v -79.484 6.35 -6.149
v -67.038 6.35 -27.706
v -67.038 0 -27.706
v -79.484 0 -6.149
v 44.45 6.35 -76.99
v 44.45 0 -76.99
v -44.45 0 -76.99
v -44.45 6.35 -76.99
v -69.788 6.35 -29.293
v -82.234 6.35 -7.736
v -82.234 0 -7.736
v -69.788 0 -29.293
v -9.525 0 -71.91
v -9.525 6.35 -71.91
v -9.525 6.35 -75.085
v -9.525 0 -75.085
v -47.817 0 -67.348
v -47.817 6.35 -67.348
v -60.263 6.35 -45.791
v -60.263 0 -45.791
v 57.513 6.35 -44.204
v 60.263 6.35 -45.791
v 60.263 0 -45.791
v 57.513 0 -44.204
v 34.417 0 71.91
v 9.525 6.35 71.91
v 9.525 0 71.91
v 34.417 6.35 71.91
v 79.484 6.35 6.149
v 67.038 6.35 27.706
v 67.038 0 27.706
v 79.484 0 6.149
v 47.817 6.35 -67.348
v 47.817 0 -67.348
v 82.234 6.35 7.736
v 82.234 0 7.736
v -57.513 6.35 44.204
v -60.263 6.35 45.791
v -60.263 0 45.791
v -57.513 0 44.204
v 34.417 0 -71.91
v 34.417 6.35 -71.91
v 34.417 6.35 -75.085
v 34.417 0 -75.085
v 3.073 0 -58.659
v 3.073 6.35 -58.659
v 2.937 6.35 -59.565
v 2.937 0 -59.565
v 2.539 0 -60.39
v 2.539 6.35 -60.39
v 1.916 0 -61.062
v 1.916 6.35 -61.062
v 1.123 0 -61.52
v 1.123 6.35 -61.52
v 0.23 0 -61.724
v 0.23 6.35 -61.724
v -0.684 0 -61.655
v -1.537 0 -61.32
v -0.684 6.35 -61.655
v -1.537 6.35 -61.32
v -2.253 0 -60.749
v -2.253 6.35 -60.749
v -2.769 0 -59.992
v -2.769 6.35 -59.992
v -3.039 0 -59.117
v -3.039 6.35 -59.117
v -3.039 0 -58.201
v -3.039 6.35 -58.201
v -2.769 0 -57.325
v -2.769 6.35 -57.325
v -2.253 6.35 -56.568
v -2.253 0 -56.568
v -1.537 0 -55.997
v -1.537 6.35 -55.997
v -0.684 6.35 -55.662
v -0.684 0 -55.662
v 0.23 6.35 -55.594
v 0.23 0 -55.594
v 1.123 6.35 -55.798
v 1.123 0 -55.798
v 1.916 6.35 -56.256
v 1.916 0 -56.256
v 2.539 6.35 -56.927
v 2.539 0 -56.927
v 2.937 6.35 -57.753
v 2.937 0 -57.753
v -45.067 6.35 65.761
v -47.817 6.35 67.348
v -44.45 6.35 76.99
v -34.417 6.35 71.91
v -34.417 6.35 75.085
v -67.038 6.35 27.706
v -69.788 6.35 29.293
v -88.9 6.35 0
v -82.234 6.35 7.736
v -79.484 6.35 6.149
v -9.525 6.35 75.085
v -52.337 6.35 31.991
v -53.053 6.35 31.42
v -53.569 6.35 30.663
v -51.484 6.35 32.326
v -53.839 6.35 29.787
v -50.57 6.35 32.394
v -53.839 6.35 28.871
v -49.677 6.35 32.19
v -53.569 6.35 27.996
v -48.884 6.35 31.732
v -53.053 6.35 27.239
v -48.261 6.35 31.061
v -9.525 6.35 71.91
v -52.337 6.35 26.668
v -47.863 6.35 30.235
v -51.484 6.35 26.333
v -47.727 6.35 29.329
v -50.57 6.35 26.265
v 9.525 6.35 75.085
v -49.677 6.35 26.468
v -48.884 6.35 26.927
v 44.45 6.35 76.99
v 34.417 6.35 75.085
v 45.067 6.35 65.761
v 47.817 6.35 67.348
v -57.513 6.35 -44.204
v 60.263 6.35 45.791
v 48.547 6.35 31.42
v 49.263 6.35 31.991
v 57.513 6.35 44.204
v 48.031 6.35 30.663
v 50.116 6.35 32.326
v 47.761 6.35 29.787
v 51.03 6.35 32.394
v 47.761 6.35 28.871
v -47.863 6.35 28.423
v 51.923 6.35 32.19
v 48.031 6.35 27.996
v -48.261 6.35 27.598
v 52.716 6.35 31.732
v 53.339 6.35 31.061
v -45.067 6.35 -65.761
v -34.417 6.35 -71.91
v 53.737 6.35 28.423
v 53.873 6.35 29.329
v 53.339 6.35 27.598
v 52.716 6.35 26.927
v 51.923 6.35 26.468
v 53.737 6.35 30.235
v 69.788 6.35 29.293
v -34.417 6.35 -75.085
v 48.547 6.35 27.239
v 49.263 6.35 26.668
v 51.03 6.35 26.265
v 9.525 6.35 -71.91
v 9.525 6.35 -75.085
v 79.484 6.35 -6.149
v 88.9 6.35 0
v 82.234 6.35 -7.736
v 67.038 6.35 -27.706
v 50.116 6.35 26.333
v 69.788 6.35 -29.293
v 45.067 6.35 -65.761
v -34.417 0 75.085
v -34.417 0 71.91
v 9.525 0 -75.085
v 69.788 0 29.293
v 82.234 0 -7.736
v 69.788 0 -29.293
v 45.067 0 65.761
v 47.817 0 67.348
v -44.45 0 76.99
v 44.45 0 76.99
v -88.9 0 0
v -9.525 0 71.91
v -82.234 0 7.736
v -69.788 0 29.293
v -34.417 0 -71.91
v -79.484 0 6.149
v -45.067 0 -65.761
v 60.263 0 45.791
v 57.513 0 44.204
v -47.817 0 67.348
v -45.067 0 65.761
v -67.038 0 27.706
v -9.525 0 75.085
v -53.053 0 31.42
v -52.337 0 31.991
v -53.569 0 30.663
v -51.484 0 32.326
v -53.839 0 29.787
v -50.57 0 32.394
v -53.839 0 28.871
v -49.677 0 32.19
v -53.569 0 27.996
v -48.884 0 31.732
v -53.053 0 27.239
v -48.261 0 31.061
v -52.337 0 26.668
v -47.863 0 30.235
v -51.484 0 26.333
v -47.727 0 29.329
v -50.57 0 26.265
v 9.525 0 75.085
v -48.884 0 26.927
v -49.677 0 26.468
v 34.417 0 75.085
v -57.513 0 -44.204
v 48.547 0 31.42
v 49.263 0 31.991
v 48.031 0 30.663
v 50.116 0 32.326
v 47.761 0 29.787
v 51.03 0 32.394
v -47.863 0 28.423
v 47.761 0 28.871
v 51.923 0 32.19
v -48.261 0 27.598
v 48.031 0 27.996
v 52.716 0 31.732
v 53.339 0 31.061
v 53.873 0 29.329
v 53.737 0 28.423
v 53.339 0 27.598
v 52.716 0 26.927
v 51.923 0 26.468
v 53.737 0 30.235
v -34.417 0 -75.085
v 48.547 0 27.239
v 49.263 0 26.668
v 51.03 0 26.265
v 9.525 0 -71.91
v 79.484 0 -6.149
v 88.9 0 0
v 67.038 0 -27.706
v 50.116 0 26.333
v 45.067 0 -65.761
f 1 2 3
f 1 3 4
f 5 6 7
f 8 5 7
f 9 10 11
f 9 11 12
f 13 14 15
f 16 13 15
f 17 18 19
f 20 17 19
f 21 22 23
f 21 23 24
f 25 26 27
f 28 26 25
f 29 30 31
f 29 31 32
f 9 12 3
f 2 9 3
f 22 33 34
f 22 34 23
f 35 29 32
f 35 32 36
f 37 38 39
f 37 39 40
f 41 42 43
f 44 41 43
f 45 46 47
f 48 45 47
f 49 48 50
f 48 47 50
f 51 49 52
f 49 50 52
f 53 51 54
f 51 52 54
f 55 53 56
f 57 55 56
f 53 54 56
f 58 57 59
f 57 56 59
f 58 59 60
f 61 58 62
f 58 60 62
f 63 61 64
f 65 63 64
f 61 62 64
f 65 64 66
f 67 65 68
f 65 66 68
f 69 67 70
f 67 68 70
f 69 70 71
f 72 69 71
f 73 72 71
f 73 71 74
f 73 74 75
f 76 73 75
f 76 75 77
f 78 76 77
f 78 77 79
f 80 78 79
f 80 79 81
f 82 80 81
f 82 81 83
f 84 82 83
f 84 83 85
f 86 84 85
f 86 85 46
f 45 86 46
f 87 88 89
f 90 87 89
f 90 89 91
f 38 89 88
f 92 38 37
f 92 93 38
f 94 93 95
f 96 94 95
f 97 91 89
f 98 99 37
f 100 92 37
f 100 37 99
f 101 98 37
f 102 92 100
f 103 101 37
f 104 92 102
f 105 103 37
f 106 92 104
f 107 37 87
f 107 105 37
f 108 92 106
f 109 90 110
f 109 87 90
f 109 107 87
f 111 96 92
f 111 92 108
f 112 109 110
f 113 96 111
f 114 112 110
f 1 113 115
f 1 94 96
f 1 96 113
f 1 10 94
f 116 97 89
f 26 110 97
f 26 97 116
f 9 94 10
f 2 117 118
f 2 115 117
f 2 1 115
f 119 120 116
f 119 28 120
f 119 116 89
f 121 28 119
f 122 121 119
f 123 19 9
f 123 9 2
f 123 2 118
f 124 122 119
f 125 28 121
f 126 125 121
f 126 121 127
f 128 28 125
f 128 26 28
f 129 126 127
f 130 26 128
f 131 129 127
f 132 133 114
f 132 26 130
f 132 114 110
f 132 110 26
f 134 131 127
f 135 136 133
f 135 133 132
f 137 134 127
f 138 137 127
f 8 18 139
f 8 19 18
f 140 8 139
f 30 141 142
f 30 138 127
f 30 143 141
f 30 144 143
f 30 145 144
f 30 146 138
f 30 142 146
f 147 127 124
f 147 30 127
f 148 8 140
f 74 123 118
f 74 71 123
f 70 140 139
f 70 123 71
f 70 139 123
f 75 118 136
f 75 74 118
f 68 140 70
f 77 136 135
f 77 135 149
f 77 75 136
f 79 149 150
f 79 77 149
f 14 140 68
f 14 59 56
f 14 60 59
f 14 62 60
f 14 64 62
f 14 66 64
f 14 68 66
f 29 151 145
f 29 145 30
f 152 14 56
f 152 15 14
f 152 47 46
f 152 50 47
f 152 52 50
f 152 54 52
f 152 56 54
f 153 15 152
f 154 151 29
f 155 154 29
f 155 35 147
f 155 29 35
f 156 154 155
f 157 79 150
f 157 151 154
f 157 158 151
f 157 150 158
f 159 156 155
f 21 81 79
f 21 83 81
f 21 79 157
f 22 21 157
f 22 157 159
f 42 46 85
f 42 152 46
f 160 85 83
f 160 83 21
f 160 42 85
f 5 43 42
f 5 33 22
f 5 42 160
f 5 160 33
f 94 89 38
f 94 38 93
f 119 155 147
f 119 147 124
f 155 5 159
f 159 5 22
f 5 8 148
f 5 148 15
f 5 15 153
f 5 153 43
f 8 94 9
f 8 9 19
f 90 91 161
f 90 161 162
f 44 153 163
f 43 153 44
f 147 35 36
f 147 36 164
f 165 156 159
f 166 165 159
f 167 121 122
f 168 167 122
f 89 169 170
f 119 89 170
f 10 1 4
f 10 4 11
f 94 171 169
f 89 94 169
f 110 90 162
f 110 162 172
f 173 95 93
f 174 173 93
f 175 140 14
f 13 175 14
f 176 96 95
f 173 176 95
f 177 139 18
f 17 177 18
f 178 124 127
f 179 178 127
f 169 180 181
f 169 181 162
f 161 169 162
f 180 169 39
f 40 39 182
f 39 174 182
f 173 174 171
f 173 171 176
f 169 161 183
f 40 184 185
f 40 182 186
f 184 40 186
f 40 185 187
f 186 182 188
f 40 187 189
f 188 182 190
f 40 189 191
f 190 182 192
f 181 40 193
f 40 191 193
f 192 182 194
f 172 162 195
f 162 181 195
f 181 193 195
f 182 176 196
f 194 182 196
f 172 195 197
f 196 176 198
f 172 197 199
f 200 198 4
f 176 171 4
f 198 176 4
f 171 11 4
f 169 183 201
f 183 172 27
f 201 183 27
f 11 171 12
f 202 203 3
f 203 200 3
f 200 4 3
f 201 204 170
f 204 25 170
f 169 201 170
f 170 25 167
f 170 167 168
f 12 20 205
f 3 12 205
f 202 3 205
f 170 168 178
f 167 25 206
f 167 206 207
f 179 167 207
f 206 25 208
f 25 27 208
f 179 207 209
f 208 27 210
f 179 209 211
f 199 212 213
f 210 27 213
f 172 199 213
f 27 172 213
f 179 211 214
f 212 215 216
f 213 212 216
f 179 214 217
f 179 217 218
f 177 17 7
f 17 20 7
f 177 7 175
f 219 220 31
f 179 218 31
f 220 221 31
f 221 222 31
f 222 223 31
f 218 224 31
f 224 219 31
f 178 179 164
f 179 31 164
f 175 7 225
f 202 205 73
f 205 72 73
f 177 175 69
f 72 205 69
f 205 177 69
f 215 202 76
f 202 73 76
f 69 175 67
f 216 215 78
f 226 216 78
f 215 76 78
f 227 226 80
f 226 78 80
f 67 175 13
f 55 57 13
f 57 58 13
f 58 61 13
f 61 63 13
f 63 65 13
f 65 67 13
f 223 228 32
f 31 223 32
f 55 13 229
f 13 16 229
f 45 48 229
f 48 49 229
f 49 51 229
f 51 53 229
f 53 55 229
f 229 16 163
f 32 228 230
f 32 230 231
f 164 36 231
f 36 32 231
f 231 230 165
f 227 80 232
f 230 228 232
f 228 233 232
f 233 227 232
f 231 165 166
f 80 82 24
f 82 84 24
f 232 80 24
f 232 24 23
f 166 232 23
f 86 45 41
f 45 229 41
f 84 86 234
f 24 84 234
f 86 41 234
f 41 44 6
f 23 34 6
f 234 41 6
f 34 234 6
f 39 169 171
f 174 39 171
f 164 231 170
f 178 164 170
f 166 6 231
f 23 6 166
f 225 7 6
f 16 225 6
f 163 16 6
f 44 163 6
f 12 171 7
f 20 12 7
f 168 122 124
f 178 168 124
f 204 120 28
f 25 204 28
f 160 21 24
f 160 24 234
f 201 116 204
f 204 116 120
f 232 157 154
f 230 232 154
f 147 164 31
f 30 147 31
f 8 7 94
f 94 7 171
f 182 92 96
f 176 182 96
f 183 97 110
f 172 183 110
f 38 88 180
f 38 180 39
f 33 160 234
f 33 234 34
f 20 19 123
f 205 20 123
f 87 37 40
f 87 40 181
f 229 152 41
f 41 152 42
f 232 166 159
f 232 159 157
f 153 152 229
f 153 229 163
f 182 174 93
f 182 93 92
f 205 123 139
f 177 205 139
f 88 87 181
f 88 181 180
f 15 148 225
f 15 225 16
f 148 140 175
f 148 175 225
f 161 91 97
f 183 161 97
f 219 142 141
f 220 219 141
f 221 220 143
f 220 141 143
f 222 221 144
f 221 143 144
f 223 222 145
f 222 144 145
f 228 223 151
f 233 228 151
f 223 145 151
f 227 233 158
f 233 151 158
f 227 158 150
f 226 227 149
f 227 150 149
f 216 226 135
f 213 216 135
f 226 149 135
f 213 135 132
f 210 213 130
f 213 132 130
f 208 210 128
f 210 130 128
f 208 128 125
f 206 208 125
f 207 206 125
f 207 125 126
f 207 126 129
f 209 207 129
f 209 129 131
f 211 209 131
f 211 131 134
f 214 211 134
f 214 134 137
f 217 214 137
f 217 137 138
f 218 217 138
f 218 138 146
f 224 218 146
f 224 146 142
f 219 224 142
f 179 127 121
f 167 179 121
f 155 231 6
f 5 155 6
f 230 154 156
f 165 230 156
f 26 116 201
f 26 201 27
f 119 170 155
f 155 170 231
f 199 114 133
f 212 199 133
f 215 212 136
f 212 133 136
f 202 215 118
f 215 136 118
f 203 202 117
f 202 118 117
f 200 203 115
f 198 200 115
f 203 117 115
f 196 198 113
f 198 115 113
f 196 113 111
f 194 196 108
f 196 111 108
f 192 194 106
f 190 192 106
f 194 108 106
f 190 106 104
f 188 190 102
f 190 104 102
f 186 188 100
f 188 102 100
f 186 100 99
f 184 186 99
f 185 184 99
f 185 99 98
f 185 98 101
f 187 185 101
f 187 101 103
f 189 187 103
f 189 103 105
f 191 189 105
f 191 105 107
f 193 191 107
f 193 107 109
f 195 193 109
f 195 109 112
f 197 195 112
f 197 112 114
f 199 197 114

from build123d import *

# Parameters (mm, degrees)
BOSS_EXTRUDE1_DEPTH = 6.35
SKETCH2_R           = 3.0734
SKETCH2_W           = 24.892
SKETCH2_H           = 3.175
CUT_EXTRUDE1_DEPTH  = 7.35


with BuildPart() as part:
    # Sketch1 → Boss-Extrude1 (new body)
    with BuildSketch(Plane(origin=(0, 0, 0), x_dir=(1, 0, 0), z_dir=(0, 1, 0))):
        Polygon((-88.9, 0), (-44.45, -76.989658396), (44.45, -76.989658396), (88.9, 0), (44.45, 76.989658396), (-44.45, 76.989658396), align=None)
    extrude(amount=BOSS_EXTRUDE1_DEPTH)

    # Sketch2 → Cut-Extrude1 (cut, through all)
    with BuildSketch(Plane(origin=(0, 6.35, 0), x_dir=(1, 0, 0), z_dir=(0, 1, 0))):
        with Locations((-50.8, -29.329393675)):
            Circle(SKETCH2_R)
        with Locations((0, 58.65878735)):
            Circle(SKETCH2_R)
        with Locations((50.8, -29.329393675)):
            Circle(SKETCH2_R)
        Polygon((-79.484090949, -6.148832876), (-82.233721606, -7.736332876), (-69.787721606, -29.293437227), (-67.038090949, -27.705937227), align=None)
        Polygon((-45.067090949, -65.76082552), (-47.816721606, -67.34832552), (-60.262721606, -45.791221169), (-57.513090949, -44.203721169), align=None)
        Polygon((-45.067090949, 65.76082552), (-47.816721606, 67.34832552), (-60.262721606, 45.791221169), (-57.513090949, 44.203721169), align=None)
        Polygon((-69.787721606, 29.293437227), (-67.038090949, 27.705937227), (-79.484090949, 6.148832876), (-82.233721606, 7.736332876), align=None)
        with Locations((21.971, 73.497158396)):
            Rectangle(SKETCH2_W, SKETCH2_H)
        with Locations((-21.971, 73.497158396)):
            Rectangle(SKETCH2_W, SKETCH2_H)
        Polygon((79.484090949, 6.148832876), (82.233721606, 7.736332876), (69.787721606, 29.293437227), (67.038090949, 27.705937227), align=None)
        Polygon((60.262721606, 45.791221169), (57.513090949, 44.203721169), (45.067090949, 65.76082552), (47.816721606, 67.34832552), align=None)
        Polygon((45.067090949, -65.76082552), (47.816721606, -67.34832552), (60.262721606, -45.791221169), (57.513090949, -44.203721169), align=None)
        Polygon((69.787721606, -29.293437227), (67.038090949, -27.705937227), (79.484090949, -6.148832876), (82.233721606, -7.736332876), align=None)
        with Locations((-21.971, -73.497158396)):
            Rectangle(SKETCH2_W, SKETCH2_H)
        with Locations((21.971, -73.497158396)):
            Rectangle(SKETCH2_W, SKETCH2_H)
    extrude(amount=-CUT_EXTRUDE1_DEPTH, mode=Mode.SUBTRACT)


solid = part.part
